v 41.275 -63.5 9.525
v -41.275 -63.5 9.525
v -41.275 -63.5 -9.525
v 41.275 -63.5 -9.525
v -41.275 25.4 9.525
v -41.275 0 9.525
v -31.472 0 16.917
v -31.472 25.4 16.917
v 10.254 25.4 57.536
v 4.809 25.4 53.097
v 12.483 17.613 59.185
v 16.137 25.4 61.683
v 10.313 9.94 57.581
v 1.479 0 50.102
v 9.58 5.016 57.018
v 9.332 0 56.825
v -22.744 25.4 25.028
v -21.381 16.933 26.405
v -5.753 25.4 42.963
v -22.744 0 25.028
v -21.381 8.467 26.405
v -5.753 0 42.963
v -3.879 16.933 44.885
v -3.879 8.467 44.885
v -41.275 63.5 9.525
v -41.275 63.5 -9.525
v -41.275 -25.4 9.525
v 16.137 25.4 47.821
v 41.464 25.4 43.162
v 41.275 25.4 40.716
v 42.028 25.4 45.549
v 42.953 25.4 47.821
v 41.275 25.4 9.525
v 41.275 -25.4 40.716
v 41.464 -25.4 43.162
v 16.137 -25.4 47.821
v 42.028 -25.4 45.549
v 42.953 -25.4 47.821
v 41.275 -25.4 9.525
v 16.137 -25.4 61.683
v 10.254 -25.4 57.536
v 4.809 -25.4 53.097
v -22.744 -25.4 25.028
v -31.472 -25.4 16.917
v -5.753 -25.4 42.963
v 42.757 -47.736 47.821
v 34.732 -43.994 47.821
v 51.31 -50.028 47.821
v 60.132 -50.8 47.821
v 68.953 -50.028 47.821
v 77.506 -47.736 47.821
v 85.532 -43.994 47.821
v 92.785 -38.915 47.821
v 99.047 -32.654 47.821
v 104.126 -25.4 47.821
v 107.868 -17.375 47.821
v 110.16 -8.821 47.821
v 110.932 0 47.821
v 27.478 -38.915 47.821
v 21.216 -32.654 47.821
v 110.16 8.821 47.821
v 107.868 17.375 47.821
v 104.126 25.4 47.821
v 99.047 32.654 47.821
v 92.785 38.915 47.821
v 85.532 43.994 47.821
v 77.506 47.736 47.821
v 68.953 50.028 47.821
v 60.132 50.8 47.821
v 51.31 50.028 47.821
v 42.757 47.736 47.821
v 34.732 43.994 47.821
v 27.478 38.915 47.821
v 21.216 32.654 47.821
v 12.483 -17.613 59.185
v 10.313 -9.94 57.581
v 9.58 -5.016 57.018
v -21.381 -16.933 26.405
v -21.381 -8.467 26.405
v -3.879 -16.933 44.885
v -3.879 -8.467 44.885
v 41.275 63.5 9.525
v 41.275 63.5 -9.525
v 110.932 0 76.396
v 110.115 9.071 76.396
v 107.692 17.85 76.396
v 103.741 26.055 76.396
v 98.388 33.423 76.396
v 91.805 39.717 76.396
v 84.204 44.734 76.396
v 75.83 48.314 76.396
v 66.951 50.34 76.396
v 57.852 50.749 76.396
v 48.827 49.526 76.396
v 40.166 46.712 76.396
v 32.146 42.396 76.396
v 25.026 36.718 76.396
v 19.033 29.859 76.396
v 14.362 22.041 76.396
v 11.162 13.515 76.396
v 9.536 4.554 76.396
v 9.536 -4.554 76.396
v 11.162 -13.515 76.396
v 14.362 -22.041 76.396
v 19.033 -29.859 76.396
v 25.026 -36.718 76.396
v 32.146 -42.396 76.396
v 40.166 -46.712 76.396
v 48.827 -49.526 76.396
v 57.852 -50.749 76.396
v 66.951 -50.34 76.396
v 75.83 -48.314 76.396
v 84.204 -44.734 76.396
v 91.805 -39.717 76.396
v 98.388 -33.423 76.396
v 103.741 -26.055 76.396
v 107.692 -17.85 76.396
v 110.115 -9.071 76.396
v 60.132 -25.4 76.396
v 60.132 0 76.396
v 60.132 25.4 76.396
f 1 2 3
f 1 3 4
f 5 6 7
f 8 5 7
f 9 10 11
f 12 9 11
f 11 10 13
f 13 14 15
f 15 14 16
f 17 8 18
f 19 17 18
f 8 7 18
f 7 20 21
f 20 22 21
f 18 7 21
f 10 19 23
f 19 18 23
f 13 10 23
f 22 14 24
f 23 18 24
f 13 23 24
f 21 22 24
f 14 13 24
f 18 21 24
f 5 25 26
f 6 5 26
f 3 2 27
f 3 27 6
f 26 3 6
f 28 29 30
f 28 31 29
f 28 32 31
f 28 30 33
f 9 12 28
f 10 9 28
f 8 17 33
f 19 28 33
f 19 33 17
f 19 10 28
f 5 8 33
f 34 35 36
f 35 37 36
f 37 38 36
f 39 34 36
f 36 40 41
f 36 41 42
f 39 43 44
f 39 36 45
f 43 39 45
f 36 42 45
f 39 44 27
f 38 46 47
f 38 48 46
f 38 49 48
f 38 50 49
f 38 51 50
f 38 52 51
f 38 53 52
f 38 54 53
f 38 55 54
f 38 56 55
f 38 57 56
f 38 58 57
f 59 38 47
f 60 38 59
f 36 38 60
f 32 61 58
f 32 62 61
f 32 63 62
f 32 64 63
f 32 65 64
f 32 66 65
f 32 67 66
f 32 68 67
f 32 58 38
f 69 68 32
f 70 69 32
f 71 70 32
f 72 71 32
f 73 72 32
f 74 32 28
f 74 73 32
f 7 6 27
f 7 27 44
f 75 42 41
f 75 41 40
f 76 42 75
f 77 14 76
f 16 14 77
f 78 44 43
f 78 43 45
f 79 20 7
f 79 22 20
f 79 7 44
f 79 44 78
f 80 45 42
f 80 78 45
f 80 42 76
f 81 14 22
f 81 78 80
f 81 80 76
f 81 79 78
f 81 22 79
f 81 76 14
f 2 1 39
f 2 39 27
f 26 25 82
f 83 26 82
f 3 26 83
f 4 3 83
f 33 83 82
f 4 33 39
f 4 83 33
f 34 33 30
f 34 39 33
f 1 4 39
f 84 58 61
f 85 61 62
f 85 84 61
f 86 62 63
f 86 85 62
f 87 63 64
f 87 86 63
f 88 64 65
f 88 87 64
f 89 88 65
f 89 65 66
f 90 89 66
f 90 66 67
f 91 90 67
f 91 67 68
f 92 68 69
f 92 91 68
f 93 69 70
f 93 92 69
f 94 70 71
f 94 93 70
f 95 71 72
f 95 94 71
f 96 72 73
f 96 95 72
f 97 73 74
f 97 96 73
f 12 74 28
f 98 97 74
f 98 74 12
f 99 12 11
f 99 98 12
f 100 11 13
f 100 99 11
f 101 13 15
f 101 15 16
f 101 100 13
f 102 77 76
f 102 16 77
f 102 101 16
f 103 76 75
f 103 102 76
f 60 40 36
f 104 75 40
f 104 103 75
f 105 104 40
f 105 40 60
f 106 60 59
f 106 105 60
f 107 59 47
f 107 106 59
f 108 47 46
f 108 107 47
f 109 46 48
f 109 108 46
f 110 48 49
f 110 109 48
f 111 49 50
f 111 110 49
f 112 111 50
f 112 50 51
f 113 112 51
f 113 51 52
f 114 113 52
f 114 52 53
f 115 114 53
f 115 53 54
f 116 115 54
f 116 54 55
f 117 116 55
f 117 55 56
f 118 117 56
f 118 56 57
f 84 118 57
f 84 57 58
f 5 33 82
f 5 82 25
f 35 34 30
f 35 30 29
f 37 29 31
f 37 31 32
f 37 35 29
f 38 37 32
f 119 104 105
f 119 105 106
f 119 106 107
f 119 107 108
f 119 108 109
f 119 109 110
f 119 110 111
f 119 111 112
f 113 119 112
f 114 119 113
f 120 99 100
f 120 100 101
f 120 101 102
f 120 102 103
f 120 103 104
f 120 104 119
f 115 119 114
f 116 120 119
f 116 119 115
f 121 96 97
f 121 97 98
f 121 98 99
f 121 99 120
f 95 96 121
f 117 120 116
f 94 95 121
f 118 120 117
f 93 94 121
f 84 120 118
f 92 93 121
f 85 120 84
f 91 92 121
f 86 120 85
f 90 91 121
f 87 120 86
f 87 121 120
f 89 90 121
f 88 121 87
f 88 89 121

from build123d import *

# Parameters (mm, degrees)
F1_DEPTH = 63.5
F2_DEPTH = 25.4


with BuildPart() as f1:
    # F0 (on Front) → F1 (new body, symmetric)
    with BuildSketch(Plane.XZ):
        Polygon((22.225, 9.525), (-41.275, 9.525), (-41.275, -9.525), (41.275, -9.525), (41.275, 9.525), align=None)
    extrude(amount=F1_DEPTH, both=True)

    # F0 (on Front) → F2 (join, symmetric)
    with BuildSketch(Plane.XZ):
        with BuildLine():
            add(Edge.make_bspline(
                [(-41.275, 9.525), (-7.472832, 31.815227), (2.111726, 70.312925), (60.131503, 76.395682)],
                knots=[0, 0, 0, 0, 121.470025, 121.470025, 121.470025, 121.470025], degree=3))
            Line((-41.275, 9.525), (22.225, 9.525))
            Line((22.225, 9.525), (22.225, 40.7162))
            ThreePointArc((22.225, 40.7162), (32.454296, 65.411904), (57.15, 75.6412))
            Line((57.15, 75.6412), (60.131503, 75.6412))
            Line((60.131503, 75.6412), (60.131503, 76.395682))
        make_face()
        with BuildLine():
            Line((22.225, 40.7162), (22.225, 9.525))
            Line((22.225, 9.525), (41.275, 9.525))
            Line((41.275, 9.525), (41.275, 40.7162))
            ThreePointArc((41.275, 40.7162), (45.92468, 51.94152), (57.15, 56.5912))
            Line((57.15, 56.5912), (60.131503, 56.5912))
            Line((60.131503, 56.5912), (60.131503, 75.6412))
            Line((60.131503, 75.6412), (57.15, 75.6412))
            ThreePointArc((57.15, 75.6412), (32.454296, 65.411904), (22.225, 40.7162))
        make_face()
    extrude(amount=F2_DEPTH, both=True)

    # F0 (on Front) → F3 (revolve)
    with BuildSketch(Plane.XZ):
        Polygon((110.931503, 76.395682), (60.131503, 76.395682), (60.131503, 75.6412), (60.131503, 56.5912), (60.131503, 47.820682), (110.931503, 47.820682), align=None)
    revolve(axis=Axis((60.131503, 0, 62.108182), (0, 0, 1)))


solid = f1.part
